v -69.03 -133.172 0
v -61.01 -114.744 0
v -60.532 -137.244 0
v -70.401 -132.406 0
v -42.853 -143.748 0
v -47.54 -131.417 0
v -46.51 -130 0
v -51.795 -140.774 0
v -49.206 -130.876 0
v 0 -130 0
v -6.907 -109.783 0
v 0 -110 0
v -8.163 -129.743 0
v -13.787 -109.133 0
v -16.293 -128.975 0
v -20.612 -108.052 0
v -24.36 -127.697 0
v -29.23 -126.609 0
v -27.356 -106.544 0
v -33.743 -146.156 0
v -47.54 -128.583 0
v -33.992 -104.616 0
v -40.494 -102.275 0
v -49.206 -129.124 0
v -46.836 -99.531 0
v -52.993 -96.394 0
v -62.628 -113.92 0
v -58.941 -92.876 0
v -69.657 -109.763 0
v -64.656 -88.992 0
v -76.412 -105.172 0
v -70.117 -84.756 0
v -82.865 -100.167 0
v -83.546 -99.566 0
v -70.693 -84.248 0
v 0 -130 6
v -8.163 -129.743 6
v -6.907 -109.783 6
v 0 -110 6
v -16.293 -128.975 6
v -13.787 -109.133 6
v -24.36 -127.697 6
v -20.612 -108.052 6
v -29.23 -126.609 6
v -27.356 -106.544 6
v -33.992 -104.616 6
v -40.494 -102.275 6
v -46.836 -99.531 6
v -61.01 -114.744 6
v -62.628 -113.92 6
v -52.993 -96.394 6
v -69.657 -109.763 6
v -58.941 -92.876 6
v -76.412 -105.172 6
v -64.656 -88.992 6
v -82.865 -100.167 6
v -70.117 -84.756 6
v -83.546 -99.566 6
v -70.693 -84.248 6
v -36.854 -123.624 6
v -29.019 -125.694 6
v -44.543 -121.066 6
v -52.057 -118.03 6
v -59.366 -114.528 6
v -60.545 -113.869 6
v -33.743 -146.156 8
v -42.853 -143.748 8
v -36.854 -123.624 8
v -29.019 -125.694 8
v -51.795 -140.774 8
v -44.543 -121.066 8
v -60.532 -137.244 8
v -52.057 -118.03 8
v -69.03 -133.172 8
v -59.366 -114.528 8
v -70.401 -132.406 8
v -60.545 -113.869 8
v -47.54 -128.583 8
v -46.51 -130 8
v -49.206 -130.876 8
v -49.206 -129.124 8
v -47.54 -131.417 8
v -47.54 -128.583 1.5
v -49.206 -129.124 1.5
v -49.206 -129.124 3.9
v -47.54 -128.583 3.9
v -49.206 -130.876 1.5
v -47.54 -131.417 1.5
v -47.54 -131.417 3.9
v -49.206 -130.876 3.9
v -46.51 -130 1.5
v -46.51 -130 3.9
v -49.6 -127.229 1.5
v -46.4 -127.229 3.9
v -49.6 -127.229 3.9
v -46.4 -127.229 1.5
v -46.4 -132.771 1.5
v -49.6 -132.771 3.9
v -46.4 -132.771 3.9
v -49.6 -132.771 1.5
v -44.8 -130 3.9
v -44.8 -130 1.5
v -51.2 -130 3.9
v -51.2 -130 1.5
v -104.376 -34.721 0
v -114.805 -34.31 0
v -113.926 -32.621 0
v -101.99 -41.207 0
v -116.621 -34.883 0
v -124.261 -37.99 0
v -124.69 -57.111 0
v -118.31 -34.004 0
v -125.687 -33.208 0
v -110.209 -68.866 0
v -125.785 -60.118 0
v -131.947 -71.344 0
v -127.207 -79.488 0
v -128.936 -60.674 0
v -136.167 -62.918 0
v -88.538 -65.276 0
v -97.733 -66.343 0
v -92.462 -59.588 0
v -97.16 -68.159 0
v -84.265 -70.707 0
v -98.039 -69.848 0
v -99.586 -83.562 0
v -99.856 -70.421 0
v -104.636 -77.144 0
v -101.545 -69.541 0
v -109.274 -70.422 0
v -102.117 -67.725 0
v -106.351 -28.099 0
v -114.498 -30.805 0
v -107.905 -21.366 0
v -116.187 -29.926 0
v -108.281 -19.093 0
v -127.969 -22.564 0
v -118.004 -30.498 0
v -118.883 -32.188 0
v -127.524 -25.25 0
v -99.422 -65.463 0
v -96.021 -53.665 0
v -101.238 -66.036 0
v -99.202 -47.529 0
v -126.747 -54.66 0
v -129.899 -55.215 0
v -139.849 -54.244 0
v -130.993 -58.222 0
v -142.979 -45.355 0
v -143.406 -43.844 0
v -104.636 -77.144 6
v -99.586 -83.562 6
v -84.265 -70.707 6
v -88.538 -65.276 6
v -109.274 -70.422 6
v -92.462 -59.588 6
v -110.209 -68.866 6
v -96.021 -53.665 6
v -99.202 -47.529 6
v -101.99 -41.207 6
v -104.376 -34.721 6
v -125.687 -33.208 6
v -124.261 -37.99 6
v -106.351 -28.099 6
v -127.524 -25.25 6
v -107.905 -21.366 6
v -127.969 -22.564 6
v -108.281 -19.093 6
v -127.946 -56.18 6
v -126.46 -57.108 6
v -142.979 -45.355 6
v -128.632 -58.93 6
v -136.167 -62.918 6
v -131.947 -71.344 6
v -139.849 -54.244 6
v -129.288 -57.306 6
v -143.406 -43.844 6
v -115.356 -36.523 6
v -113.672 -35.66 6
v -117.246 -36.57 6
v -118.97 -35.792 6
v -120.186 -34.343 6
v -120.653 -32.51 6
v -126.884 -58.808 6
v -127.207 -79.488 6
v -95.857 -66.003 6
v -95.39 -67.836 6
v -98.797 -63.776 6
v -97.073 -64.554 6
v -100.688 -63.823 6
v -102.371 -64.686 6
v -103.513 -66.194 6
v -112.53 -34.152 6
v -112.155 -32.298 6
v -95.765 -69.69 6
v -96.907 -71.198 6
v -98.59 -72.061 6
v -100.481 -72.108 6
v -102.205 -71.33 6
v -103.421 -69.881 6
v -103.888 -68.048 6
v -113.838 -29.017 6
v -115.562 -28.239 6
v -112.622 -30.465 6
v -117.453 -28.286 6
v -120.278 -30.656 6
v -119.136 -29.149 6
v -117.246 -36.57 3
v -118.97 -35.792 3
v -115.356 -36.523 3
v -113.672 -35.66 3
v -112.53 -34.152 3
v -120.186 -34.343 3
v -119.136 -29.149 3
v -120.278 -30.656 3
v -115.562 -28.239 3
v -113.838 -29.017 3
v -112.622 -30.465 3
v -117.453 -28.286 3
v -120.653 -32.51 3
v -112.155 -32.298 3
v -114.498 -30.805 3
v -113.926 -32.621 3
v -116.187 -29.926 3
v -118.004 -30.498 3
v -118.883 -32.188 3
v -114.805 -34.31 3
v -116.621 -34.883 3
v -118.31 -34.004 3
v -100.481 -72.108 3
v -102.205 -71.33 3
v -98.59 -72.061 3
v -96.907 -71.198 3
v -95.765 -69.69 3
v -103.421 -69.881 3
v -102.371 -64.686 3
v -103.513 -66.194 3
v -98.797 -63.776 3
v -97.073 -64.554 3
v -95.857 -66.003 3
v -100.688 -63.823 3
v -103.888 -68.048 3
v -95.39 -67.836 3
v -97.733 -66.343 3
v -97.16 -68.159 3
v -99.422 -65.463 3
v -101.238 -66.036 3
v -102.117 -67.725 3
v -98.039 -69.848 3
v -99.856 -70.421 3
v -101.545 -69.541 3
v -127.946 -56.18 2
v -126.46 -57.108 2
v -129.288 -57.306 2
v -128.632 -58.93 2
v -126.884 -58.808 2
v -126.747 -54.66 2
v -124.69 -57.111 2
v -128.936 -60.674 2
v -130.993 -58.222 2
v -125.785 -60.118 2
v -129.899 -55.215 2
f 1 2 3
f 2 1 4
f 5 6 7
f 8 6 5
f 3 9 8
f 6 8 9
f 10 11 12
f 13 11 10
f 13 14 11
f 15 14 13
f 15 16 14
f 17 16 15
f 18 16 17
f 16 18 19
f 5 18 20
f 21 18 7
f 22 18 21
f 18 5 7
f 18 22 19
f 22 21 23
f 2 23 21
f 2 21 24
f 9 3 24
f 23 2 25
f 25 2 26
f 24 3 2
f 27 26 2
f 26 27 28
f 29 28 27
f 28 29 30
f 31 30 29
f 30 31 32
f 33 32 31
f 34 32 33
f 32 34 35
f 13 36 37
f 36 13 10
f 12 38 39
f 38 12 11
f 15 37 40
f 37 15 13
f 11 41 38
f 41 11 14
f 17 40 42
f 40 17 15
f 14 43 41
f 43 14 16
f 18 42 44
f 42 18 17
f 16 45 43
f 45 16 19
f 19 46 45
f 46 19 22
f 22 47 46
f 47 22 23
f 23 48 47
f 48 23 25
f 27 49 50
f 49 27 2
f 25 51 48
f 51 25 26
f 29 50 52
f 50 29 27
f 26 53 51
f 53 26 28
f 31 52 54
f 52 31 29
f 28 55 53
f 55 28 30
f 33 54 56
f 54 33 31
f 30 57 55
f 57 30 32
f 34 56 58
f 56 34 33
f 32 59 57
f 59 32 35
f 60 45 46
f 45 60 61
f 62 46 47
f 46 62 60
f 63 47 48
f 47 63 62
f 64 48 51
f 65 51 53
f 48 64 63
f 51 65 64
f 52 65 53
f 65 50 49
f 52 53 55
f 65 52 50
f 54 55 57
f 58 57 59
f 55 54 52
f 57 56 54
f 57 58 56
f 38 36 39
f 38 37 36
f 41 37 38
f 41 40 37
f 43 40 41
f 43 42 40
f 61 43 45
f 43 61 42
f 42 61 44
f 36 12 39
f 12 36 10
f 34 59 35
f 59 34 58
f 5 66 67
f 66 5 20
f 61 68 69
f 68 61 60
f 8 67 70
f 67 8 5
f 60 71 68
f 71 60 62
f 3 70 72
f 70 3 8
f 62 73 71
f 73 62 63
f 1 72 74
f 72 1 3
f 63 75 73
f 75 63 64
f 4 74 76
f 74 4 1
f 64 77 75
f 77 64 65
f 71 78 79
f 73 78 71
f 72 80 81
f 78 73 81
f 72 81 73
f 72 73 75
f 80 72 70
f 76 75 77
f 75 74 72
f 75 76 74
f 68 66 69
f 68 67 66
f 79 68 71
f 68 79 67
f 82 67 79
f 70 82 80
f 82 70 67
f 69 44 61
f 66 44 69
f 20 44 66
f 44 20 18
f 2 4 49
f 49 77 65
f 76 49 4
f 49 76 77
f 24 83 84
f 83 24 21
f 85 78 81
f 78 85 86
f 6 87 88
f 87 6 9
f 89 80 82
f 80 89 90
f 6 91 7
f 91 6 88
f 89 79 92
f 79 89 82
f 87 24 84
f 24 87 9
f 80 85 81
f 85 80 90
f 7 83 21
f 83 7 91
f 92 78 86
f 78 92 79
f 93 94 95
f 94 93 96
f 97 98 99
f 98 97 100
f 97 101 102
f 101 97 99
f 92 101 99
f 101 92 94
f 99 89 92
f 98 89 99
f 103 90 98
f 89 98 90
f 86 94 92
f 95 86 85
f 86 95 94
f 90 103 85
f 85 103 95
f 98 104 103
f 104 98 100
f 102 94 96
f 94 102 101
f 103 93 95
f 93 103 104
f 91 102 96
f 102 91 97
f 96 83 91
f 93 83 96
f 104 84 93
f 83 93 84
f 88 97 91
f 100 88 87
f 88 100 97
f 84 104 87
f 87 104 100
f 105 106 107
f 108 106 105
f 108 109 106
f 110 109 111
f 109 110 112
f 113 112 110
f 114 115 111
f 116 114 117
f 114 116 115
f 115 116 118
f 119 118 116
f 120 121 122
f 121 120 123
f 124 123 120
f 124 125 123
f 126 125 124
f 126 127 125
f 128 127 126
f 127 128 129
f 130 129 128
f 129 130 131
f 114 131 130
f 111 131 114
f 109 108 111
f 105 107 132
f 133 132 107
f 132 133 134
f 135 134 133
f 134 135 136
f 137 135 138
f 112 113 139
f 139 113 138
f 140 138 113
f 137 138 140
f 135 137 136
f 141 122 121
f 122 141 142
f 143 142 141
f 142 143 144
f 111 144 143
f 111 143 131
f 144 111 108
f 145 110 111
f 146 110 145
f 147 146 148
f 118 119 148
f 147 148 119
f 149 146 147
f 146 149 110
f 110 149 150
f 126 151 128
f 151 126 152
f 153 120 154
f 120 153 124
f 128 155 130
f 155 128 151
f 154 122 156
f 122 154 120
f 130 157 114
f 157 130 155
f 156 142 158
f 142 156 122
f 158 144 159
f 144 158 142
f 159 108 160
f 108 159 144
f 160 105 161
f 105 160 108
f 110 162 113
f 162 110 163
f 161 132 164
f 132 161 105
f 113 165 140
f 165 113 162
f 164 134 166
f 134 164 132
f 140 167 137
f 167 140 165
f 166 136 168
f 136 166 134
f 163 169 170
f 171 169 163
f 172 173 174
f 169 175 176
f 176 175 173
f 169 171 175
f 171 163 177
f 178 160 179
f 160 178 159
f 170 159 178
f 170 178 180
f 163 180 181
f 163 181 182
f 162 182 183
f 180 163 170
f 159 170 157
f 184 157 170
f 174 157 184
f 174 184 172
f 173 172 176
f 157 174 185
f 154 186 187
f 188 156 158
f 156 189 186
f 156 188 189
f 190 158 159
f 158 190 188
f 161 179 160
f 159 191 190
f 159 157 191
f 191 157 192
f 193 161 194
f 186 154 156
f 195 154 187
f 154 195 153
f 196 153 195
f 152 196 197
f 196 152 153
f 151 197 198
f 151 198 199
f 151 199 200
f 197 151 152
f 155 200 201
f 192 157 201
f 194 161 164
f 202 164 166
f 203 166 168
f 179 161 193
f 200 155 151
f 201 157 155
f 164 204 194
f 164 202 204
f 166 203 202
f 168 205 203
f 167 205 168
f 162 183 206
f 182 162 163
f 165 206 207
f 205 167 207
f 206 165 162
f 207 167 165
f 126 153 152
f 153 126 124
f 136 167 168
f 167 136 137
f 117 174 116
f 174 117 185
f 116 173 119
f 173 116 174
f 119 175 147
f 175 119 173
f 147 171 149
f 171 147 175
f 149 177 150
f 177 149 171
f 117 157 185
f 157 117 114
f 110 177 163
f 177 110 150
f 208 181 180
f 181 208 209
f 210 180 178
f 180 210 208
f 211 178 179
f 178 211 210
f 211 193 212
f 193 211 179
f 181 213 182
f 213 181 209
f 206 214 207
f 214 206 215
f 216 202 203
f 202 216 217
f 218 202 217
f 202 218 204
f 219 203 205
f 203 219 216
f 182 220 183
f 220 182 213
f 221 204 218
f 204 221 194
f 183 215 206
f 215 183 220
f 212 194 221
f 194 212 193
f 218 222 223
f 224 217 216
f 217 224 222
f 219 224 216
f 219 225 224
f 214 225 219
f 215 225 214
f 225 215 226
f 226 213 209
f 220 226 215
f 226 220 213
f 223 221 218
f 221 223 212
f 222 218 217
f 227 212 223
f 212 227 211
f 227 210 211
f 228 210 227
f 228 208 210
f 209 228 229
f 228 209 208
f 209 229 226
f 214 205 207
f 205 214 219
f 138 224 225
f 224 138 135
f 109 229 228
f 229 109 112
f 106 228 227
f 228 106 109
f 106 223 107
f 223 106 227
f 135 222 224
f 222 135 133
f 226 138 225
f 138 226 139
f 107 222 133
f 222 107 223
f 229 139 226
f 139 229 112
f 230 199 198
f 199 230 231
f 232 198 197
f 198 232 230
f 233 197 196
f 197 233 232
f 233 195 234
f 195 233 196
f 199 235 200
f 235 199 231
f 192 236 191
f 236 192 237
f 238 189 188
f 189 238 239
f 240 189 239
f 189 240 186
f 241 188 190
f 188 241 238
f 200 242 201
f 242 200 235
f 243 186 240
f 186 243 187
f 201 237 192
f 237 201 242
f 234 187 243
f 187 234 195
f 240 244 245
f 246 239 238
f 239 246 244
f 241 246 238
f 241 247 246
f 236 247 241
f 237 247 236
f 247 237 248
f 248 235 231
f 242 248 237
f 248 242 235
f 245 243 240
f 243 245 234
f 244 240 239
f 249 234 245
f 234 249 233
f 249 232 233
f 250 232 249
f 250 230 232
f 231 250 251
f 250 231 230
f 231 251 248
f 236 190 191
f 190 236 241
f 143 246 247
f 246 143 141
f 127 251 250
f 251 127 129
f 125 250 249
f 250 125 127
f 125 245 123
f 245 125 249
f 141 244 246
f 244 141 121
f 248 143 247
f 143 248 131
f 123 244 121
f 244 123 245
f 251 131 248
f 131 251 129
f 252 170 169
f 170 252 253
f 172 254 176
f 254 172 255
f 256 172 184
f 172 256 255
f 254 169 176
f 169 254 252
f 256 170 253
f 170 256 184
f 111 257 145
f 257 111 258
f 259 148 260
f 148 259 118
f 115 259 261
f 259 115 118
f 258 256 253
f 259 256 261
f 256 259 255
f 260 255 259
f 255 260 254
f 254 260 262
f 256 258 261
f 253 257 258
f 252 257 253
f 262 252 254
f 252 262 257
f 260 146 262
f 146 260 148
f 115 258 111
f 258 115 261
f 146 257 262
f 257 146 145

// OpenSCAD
use <MCAD/nuts_and_bolts.scad>;

module arc( height, depth, radius, degrees ) {
    // This dies a horible death if it's not rendered here 
    // -- sucks up all memory and spins out of control 
    render() {
        difference() {
            // Outer ring
            rotate_extrude($fn = 100)
                translate([radius - height, 0, 0])
                    square([height,depth]);
         
            // Cut half off
            translate([0,-(radius+1),-.5]) 
                cube ([radius+1,(radius+1)*2,depth+1]);
         
            // Cover the other half as necessary
            rotate([0,0,180-degrees])
            translate([0,-(radius+1),-.5]) 
                cube ([radius+1,(radius+1)*2,depth+1]);
         
        }
    }
}

module glass_tab_cuts()
{

 translate([-50,-110,3]) rotate([180,0,0]) boltHole(5,"MM", 50);
 translate([-12,-120,3]) rotate([180,0,0]) boltHole(5,"MM", 50);
 translate([-38,-135,45]) rotate([180,0,0]) boltHole(3,"MM", 50);
 translate([-38,-135,2]) rotate([180,0,0]) nutHole(3,"MM");
}



module glass_tab_body()
{
	
    arc(20, 6, 130, 30);
    rotate([0,0,-8]) arc(21, 6, 150, 15);
    %translate([-50,-110,4]) rotate([180,0,0]) boltHole(5,"MM", 50);
    %translate([-12,-120,4]) rotate([180,0,0]) boltHole(5,"MM", 50);
    %translate([-38,-135,45]) rotate([180,0,0]) boltHole(3,"MM", 50);
    %translate([-38,-135,3.9]) rotate([180,0,0]) nutHole(3,"MM");
}

module glass_tab()
{
	
        difference(){
             glass_tab_body();
             glass_tab_cuts();
             }

}

module glass_mount_cuts()
{

    translate([-48,-130,45]) rotate([180,0,0]) boltHole(3,"MM", 50);
    translate([-48,-130,3.9]) rotate([180,0,0]) nutHole(3,"MM");

}

module glass_mount_body()
{
	
    arc(20, 6, 130, 40);
    rotate([0,0,-13]) arc(21, 8, 150, 15);
    %translate([-48,-130,45]) rotate([180,0,0]) boltHole(3,"MM", 50);
    %translate([-48,-130,3.9]) rotate([180,0,0]) nutHole(3,"MM");

}

module glass_mount()
{
	difference(){
	   glass_mount_body();
	   glass_mount_cuts();
       }

}

glass_mount();
rotate([0,0,-50]) glass_tab();
